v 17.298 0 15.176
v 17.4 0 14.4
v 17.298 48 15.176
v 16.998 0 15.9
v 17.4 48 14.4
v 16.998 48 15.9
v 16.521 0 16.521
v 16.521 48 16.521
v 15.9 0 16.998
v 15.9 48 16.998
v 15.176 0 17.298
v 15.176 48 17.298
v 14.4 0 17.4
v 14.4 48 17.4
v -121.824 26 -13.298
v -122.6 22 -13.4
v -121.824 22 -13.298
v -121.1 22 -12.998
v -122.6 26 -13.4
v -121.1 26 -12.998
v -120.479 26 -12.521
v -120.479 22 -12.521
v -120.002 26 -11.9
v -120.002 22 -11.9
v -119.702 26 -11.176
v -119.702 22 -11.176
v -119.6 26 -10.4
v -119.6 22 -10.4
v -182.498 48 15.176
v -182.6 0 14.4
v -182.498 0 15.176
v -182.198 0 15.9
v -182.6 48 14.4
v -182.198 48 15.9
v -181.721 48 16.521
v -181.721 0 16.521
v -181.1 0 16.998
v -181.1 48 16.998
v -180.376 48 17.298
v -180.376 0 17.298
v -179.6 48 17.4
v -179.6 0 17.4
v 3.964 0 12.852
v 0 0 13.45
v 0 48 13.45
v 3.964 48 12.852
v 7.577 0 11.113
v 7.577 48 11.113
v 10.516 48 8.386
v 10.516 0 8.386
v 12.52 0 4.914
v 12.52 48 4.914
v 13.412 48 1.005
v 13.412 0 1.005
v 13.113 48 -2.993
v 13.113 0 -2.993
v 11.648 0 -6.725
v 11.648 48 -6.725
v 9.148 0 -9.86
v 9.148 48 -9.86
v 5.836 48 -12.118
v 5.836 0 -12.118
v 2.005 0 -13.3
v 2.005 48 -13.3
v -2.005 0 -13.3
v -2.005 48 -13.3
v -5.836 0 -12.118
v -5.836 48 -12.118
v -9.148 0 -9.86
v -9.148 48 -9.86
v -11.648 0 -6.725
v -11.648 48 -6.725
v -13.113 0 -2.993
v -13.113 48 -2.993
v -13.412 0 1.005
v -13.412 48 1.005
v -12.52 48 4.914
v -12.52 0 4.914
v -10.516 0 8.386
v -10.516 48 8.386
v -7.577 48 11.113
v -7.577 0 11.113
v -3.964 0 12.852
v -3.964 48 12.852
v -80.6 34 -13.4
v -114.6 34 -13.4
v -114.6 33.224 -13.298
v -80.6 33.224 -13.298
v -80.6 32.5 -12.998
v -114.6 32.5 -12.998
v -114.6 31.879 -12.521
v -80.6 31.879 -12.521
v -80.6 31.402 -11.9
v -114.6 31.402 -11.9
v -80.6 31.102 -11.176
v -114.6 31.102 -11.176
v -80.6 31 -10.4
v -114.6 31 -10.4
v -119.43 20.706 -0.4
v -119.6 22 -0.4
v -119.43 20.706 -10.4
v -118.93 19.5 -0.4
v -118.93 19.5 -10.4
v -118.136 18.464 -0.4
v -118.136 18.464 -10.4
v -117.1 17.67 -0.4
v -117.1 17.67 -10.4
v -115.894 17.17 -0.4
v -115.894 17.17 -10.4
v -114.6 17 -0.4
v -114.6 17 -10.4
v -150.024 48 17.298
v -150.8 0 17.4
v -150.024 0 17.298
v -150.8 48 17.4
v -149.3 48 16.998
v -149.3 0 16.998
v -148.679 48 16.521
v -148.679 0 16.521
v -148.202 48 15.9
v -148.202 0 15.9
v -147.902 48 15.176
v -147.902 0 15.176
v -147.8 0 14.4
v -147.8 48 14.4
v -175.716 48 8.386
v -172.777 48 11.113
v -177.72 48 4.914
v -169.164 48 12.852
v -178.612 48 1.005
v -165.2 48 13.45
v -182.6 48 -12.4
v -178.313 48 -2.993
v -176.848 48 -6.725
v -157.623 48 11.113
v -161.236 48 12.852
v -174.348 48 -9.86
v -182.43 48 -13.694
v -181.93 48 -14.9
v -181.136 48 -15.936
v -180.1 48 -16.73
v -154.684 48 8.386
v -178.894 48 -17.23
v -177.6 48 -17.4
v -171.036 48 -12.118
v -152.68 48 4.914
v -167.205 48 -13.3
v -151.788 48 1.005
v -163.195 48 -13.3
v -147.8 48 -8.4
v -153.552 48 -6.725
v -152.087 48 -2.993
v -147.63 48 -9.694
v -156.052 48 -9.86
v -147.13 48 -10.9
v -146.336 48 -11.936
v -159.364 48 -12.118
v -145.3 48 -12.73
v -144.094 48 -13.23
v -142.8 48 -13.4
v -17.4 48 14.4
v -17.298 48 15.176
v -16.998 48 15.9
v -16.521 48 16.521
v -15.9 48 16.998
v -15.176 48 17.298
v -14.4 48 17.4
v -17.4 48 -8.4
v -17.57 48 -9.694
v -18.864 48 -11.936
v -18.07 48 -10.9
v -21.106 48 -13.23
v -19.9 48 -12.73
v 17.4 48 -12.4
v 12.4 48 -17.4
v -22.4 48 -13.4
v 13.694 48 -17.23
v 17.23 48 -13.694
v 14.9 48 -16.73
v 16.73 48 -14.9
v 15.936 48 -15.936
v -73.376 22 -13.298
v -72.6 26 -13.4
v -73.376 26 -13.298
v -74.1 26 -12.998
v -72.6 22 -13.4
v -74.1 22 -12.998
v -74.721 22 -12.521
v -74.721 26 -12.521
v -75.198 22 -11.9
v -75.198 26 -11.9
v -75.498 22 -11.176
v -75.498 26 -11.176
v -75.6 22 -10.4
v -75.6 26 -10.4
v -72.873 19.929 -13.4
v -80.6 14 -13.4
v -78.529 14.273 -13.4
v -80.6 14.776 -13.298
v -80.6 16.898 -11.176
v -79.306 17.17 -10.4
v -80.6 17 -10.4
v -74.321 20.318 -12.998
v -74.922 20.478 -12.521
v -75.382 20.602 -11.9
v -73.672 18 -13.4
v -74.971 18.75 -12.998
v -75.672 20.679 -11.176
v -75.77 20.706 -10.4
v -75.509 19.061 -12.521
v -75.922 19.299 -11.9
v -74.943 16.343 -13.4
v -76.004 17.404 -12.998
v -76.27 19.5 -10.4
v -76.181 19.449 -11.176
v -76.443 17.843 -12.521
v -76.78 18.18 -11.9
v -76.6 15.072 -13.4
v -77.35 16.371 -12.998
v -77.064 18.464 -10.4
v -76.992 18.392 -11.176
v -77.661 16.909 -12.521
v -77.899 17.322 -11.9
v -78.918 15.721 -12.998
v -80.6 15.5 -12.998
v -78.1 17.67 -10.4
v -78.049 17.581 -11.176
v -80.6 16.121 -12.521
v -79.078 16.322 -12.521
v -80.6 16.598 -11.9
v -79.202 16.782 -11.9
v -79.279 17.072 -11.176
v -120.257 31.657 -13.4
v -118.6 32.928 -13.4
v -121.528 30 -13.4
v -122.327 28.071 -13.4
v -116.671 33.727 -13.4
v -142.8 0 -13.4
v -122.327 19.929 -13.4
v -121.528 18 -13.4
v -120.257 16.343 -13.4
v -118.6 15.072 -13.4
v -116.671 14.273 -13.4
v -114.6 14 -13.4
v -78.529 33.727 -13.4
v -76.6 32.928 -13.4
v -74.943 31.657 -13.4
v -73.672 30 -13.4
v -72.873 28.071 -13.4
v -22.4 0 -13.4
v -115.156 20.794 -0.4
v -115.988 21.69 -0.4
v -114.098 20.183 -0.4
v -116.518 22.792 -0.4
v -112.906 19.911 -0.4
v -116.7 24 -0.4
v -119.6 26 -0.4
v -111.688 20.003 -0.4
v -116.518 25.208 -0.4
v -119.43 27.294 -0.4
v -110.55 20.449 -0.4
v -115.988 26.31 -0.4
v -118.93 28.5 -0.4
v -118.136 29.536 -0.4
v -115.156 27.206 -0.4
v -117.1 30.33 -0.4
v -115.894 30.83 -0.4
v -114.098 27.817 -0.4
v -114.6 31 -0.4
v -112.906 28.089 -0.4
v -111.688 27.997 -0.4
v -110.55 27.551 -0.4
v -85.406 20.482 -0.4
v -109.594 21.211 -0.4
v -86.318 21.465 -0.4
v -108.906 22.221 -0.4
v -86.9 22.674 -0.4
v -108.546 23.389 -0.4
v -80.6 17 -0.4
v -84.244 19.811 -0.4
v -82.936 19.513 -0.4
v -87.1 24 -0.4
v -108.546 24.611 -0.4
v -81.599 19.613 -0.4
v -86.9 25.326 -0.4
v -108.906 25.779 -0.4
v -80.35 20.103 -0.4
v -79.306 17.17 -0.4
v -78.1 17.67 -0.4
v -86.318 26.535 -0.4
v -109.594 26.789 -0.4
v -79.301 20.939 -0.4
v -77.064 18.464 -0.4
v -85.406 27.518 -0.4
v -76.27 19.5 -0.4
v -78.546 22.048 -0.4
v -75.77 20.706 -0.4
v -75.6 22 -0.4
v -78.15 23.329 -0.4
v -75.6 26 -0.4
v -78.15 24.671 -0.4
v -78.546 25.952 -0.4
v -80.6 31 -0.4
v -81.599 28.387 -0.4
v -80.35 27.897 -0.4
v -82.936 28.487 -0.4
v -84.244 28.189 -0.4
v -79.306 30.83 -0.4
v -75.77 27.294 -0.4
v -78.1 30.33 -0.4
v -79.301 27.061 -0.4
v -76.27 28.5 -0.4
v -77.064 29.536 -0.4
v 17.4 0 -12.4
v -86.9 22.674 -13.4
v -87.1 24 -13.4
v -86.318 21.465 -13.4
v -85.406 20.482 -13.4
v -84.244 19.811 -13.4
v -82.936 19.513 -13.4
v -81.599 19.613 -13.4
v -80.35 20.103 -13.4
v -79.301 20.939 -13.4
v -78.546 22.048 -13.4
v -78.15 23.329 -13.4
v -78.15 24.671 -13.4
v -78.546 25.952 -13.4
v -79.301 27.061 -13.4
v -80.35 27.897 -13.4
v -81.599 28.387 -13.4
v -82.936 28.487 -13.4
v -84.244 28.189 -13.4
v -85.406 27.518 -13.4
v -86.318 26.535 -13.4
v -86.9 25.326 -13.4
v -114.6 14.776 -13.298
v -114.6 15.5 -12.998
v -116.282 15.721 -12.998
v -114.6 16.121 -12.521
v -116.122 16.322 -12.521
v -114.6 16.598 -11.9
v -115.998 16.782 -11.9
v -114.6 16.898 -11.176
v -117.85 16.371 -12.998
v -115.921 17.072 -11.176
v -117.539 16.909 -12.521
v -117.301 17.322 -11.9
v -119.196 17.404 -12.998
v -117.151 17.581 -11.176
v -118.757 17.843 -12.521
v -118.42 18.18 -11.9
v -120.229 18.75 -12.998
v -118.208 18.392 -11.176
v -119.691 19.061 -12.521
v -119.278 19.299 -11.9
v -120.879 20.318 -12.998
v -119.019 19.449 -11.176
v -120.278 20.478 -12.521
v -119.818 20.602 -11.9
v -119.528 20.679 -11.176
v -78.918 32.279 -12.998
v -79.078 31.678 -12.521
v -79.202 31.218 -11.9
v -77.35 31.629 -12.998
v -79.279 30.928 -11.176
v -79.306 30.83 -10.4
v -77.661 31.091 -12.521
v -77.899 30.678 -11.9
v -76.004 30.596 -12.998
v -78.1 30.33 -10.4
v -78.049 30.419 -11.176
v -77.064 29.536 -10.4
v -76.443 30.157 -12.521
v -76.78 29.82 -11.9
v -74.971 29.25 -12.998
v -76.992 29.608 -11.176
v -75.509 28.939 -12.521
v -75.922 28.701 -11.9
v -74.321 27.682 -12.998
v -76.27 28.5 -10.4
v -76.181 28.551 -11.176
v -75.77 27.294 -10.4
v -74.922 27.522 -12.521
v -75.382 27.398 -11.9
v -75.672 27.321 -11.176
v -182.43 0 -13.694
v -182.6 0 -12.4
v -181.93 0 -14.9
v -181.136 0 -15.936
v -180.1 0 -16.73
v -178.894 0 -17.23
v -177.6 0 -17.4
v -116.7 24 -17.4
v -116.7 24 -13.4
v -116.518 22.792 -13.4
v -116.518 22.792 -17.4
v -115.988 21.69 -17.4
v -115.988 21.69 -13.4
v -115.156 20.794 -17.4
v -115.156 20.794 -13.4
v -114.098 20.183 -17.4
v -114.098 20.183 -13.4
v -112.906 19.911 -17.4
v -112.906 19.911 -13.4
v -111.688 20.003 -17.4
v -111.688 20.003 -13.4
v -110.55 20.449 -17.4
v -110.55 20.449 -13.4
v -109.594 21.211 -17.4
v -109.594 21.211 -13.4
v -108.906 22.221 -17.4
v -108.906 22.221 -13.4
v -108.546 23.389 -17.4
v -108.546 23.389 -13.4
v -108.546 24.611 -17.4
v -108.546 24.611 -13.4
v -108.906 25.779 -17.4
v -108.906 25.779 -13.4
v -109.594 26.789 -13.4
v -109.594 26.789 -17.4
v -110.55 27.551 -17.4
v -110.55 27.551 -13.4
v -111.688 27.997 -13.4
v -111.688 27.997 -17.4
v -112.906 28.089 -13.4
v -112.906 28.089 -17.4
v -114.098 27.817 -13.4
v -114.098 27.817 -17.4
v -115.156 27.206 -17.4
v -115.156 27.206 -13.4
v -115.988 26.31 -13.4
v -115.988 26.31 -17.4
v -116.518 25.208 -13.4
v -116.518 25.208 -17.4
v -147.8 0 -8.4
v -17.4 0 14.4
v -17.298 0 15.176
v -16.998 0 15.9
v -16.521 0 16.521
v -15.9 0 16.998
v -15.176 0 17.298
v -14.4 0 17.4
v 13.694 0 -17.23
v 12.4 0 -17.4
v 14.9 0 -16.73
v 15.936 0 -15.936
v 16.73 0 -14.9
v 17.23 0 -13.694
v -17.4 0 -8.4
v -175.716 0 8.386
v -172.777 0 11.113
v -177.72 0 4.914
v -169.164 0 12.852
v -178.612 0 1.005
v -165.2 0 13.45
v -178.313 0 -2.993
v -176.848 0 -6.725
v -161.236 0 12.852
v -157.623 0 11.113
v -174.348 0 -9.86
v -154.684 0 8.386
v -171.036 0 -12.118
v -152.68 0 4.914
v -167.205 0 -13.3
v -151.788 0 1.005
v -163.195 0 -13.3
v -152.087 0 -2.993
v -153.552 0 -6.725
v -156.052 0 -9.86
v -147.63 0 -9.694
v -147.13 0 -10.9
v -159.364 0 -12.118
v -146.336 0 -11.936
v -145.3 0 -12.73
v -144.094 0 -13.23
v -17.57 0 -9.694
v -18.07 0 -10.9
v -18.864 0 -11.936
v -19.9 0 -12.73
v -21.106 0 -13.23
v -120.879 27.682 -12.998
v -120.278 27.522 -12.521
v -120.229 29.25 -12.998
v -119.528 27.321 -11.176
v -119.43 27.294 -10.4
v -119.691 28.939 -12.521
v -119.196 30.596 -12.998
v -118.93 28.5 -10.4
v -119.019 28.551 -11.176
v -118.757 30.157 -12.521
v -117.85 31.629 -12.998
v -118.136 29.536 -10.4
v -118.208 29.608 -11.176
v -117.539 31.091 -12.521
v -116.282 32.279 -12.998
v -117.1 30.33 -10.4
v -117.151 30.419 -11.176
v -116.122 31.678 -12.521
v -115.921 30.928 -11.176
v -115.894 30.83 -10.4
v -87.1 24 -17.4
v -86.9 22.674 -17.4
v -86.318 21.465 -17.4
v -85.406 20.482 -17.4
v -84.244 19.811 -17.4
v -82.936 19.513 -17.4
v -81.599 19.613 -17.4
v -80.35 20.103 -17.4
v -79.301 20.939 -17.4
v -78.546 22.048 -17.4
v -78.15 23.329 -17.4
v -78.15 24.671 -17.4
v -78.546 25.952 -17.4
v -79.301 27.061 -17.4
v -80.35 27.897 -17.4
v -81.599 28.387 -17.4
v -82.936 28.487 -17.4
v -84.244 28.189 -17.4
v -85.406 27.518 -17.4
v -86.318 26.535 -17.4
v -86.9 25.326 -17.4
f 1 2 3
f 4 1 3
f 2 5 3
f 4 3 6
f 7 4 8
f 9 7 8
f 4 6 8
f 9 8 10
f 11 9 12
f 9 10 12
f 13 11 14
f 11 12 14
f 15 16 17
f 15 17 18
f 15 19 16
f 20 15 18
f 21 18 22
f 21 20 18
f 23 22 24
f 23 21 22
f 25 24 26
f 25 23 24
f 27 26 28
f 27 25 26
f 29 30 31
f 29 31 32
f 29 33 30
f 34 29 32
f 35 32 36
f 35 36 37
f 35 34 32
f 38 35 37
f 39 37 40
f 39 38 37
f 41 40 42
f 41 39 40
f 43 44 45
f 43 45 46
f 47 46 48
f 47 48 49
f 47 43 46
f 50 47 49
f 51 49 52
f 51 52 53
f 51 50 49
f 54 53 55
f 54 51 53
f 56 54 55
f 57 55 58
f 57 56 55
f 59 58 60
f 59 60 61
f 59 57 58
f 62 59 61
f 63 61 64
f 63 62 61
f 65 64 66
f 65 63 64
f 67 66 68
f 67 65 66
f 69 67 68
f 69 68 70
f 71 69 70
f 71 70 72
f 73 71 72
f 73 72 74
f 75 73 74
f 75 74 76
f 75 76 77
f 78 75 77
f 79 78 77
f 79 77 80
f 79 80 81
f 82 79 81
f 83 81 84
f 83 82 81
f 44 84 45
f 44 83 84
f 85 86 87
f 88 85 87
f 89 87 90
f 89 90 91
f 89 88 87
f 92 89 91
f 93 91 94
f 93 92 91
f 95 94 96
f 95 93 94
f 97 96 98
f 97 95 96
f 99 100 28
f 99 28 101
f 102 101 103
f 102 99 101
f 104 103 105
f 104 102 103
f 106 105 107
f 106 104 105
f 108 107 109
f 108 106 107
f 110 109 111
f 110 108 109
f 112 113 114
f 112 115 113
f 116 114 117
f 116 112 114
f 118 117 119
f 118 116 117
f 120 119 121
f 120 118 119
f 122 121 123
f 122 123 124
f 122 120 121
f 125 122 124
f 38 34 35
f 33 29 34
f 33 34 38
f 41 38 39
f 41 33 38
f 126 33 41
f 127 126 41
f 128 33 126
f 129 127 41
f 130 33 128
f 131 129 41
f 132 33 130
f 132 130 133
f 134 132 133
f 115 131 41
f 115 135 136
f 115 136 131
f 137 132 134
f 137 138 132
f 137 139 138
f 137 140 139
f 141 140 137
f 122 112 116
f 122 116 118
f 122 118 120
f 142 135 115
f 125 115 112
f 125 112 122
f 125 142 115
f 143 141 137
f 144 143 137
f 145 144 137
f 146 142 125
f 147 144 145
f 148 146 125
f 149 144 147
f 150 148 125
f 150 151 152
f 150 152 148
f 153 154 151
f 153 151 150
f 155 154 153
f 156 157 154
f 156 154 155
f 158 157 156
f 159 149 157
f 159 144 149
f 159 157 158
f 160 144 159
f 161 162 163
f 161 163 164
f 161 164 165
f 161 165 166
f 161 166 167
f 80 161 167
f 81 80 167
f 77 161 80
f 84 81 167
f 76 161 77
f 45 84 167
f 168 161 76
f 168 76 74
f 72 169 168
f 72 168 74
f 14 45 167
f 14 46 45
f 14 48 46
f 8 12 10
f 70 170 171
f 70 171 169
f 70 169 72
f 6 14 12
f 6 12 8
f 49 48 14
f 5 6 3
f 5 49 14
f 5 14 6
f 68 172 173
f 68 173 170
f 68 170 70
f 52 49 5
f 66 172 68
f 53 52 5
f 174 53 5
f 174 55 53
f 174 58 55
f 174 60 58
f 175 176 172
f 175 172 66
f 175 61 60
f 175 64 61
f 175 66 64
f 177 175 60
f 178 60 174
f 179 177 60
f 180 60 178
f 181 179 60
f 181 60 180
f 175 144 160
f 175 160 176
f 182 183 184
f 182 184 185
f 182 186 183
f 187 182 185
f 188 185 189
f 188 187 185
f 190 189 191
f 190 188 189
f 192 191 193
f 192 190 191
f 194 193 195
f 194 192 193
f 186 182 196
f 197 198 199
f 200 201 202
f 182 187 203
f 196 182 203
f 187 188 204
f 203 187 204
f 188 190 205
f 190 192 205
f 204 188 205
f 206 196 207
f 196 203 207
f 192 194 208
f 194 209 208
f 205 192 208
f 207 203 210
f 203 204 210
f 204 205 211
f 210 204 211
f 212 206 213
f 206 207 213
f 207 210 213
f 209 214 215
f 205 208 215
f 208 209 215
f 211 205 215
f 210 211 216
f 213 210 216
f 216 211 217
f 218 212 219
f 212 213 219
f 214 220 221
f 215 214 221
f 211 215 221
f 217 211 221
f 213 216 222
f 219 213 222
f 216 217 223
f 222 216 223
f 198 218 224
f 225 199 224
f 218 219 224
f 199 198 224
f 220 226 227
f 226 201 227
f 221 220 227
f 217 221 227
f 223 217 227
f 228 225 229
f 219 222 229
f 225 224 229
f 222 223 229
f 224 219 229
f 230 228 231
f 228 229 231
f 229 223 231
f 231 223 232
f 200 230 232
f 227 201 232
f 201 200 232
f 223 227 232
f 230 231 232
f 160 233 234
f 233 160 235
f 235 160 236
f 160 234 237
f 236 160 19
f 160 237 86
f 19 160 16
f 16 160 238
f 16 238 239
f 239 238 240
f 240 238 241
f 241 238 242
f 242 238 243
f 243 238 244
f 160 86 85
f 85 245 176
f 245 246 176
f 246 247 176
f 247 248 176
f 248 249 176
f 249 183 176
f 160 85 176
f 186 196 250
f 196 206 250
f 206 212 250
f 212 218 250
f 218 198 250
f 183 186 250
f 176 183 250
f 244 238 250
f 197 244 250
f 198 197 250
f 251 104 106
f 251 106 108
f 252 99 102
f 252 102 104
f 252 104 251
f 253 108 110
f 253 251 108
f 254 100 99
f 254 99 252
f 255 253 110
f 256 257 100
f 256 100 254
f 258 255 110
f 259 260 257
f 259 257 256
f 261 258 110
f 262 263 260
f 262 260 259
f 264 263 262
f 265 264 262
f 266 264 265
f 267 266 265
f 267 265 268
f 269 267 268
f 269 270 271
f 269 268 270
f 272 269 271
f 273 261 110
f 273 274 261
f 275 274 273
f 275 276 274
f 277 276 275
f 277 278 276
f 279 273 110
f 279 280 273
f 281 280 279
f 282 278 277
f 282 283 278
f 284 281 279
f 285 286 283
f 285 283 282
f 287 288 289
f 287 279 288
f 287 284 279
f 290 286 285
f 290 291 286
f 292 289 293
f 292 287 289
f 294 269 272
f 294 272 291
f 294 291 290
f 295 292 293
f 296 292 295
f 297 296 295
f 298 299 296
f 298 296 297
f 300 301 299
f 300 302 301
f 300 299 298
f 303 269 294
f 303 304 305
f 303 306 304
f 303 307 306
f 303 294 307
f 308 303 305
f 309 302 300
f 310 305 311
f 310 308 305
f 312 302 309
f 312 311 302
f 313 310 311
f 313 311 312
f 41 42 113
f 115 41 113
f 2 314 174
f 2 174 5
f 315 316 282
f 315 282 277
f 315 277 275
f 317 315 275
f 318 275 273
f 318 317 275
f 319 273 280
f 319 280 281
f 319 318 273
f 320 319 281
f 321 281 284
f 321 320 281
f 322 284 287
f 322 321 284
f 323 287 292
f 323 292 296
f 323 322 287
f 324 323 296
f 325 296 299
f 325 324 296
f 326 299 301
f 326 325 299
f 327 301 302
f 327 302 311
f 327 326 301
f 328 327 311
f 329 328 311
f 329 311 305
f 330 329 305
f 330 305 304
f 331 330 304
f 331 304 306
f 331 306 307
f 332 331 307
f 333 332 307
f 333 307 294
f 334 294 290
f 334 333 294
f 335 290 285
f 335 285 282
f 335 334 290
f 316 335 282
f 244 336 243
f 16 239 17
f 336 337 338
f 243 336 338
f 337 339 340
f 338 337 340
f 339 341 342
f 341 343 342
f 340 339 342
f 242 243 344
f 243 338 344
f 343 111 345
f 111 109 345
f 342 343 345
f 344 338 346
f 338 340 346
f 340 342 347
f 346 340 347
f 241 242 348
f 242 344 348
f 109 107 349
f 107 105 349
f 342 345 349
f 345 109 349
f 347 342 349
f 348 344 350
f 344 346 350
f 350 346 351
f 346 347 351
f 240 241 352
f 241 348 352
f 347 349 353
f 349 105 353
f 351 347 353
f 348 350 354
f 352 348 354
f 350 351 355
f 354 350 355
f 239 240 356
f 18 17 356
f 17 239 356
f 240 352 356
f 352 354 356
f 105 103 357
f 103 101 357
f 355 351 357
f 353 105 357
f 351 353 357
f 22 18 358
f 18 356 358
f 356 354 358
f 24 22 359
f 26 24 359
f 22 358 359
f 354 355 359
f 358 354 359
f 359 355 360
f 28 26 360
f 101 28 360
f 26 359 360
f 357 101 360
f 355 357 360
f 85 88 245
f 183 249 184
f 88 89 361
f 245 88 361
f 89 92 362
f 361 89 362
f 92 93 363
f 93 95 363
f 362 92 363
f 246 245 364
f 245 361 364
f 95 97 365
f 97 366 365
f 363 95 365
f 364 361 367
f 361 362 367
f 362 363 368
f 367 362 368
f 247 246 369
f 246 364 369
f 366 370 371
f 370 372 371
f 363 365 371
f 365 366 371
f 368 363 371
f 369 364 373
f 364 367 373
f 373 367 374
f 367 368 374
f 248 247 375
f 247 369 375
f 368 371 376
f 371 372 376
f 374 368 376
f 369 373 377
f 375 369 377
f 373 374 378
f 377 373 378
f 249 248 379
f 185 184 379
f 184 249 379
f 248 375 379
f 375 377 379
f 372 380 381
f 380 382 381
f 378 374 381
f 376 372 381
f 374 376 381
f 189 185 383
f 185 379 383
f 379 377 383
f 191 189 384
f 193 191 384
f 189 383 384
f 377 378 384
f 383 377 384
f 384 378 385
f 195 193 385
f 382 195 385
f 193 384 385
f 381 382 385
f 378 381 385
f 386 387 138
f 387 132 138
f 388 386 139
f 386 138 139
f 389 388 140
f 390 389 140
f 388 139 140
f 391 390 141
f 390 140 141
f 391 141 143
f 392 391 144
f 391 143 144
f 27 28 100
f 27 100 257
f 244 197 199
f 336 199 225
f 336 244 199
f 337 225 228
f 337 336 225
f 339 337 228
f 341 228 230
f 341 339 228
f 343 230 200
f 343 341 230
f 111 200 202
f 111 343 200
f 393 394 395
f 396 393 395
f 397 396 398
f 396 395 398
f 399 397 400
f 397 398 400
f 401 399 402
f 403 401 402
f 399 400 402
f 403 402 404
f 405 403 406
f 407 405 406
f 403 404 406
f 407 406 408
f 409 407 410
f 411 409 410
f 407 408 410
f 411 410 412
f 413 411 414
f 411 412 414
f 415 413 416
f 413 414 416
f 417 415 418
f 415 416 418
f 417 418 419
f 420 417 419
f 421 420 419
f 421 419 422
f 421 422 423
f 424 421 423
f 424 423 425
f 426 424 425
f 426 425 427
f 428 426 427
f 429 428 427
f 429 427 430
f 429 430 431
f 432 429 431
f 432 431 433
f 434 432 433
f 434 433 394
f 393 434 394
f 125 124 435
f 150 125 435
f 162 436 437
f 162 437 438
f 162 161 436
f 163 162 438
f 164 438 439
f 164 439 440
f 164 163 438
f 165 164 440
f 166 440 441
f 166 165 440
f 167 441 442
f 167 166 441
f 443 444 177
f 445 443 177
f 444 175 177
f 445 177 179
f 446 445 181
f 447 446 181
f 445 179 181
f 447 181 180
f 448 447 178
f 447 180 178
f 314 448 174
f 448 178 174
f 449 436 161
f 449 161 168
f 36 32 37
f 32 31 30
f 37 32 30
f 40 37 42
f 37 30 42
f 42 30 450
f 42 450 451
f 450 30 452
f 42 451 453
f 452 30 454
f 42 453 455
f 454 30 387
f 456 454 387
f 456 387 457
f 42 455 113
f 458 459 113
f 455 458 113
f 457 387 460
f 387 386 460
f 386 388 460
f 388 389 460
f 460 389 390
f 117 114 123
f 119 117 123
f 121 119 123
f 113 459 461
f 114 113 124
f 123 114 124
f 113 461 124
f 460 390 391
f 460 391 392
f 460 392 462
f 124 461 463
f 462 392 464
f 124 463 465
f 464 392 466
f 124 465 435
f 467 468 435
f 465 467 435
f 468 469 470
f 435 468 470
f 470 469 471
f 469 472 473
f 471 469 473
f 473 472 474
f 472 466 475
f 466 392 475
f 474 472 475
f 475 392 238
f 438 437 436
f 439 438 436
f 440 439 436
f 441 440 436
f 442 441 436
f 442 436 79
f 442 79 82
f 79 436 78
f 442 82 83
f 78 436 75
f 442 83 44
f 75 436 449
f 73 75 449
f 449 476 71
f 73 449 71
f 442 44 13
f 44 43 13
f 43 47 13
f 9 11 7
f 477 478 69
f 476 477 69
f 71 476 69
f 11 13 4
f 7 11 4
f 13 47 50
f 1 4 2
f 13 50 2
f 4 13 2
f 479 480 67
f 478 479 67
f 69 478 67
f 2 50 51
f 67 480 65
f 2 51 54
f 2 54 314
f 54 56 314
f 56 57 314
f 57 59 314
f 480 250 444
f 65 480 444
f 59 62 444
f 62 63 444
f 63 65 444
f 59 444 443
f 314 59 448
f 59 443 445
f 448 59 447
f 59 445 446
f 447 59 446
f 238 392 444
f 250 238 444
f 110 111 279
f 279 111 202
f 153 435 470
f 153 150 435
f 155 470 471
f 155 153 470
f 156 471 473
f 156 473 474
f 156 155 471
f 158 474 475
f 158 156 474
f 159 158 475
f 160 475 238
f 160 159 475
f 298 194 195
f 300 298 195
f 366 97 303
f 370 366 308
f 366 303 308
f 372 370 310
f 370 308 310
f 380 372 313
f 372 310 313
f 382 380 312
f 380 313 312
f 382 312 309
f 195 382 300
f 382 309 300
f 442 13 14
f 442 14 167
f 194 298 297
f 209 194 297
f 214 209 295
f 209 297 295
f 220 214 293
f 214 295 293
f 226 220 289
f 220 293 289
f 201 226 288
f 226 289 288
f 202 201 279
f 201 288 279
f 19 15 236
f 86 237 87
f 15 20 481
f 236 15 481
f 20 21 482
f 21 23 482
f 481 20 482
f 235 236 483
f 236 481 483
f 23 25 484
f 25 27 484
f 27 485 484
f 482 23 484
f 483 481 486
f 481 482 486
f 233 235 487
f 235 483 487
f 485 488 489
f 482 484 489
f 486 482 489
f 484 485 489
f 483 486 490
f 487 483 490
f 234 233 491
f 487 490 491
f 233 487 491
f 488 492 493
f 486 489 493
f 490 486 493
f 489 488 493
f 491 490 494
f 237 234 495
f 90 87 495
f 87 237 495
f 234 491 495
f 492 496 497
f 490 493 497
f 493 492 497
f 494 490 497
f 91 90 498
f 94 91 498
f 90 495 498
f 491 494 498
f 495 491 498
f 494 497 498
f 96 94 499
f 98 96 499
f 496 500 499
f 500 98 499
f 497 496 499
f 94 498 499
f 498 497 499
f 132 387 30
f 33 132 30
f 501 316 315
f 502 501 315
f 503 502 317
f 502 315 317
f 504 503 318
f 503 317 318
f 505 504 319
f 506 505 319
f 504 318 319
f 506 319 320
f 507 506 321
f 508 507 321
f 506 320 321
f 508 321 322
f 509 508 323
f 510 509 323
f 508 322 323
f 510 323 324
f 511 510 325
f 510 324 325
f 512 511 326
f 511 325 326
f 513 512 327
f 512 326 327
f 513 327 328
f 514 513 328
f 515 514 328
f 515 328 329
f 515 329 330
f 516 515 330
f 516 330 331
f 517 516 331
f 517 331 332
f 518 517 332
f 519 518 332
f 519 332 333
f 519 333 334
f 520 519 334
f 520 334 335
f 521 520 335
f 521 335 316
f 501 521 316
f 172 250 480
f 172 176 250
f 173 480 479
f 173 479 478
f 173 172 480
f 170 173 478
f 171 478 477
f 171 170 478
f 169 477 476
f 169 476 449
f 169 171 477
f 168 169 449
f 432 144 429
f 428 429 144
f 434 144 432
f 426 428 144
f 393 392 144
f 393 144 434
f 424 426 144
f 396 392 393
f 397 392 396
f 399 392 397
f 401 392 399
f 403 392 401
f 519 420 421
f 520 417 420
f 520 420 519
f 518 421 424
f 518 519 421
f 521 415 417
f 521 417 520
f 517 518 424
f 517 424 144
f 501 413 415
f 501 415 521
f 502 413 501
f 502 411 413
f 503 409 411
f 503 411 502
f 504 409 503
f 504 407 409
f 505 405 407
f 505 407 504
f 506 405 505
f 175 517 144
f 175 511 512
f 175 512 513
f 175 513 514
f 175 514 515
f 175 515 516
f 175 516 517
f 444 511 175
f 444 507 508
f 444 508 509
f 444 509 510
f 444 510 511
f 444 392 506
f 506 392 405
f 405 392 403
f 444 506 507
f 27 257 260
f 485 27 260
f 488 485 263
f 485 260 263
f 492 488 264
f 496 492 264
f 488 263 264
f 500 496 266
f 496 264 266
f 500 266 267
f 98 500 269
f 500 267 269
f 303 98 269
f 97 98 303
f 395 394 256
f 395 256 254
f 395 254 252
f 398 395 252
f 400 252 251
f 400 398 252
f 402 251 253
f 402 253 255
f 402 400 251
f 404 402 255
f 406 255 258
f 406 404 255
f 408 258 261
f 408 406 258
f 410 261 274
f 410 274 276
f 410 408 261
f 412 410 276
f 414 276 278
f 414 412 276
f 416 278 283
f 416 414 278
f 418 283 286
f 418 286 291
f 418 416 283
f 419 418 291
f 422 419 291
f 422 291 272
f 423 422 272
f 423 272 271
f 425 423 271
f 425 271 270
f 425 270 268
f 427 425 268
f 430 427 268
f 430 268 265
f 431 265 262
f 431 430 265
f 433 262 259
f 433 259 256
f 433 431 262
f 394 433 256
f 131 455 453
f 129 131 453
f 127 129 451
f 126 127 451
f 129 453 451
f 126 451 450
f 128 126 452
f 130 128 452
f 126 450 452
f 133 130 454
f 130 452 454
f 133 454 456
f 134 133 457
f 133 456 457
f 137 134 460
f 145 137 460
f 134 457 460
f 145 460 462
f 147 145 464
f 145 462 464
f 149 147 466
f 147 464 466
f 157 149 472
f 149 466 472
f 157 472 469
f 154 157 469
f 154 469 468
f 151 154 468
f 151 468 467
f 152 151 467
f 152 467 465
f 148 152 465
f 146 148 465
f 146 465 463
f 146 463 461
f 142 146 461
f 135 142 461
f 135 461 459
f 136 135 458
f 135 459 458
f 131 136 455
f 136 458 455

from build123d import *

# Parameters (mm, degrees)
SKETCH1_R           = 13.45
BOSS_EXTRUDE2_DEPTH = 48
SKETCH7_W           = 44
SKETCH7_H           = 14
SKETCH7_R           = 4.5
SKETCH7_R_2         = 4.1
BOSS_EXTRUDE3_DEPTH = 13
FILLET1_R           = 3
FILLET2_R           = 5
FILLET3_R           = 5
FILLET4_R           = 3
SKETCH8_R           = 4.1
SKETCH8_R_2         = 4.5
CUT_EXTRUDE1_DEPTH  = 192.299242027


with BuildPart() as part:
    # Sketch1 → Boss-Extrude2 (new body)
    with BuildSketch(Plane(origin=(0, 0, 0), x_dir=(1, 0, 0), z_dir=(0, 1, 0))):
        Polygon((-17.4, 17.4), (17.4, 17.4), (17.4, -17.4), (-17.4, -17.4), (-17.4, 13.4), (-82.6, 13.4), (-82.6, 17.4), align=None)
        with Locations(Location((0, 0, 0), (0, 0, 270))):
            Circle(SKETCH1_R, mode=Mode.SUBTRACT)
    boss_extrude2 = extrude(amount=BOSS_EXTRUDE2_DEPTH)

    # Mirror2: Boss-Extrude2 across plane
    add(boss_extrude2.mirror(Plane(origin=(-82.6, 48, -17.4), x_dir=(0, 0, 1), z_dir=(1, 0, 0))))

    # Sketch7 → Boss-Extrude3 (add)
    with BuildSketch(Plane.XY.offset(-13.4)):
        with Locations((-97.6, 24)):
            Rectangle(SKETCH7_W, SKETCH7_H)
        with Locations(Location((-82.6, 24, 0), (0, 0, 180))):
            Circle(SKETCH7_R, mode=Mode.SUBTRACT)
        with Locations(Location((-112.6, 24, 0), (0, 0, 180))):
            Circle(SKETCH7_R_2, mode=Mode.SUBTRACT)
    extrude(amount=BOSS_EXTRUDE3_DEPTH)

    # Fillet1
    fillet1_edges = [part.edges().sort_by_distance(p)[0] for p in [
        (17.4, 24, 17.4),
        (-17.4, 24, 17.4),
        (-182.6, 24, 17.4),
        (-147.8, 24, 17.4),
    ]]
    fillet(fillet1_edges, radius=FILLET1_R)

    # Fillet2
    fillet2_edges = [part.edges().sort_by_distance(p)[0] for p in [
        (-17.4, 24, -13.4),
        (17.4, 24, -17.4),
        (-182.6, 24, -17.4),
        (-147.8, 24, -13.4),
    ]]
    fillet(fillet2_edges, radius=FILLET2_R)

    # Fillet3
    fillet3_edges = [part.edges().sort_by_distance(p)[0] for p in [
        (-75.6, 17, -6.9),
        (-75.6, 31, -6.9),
        (-119.6, 31, -6.9),
        (-119.6, 17, -6.9),
    ]]
    fillet(fillet3_edges, radius=FILLET3_R)

    # Fillet4
    fillet4_edges = [part.edges().sort_by_distance(p)[0] for p in [
        (-97.6, 31, -13.4),
        (-75.6, 24, -13.4),
        (-97.6, 17, -13.4),
        (-119.6, 24, -13.4),
        (-77.064466094, 29.535533906, -13.4),
        (-77.064466094, 18.464466094, -13.4),
        (-118.135533906, 29.535533906, -13.4),
        (-118.135533906, 18.464466094, -13.4),
    ]]
    fillet(fillet4_edges, radius=FILLET4_R)

    # Sketch8 → Cut-Extrude1 (cut, through all)
    with BuildSketch(Plane.XY.offset(-13.4)):
        with Locations(Location((-112.6, 24, 0), (0, 0, 180))):
            Circle(SKETCH8_R)
        with Locations(Location((-82.6, 24, 0), (0, 0, 180))):
            Circle(SKETCH8_R_2)
    extrude(amount=-CUT_EXTRUDE1_DEPTH, mode=Mode.SUBTRACT)


solid = part.part
